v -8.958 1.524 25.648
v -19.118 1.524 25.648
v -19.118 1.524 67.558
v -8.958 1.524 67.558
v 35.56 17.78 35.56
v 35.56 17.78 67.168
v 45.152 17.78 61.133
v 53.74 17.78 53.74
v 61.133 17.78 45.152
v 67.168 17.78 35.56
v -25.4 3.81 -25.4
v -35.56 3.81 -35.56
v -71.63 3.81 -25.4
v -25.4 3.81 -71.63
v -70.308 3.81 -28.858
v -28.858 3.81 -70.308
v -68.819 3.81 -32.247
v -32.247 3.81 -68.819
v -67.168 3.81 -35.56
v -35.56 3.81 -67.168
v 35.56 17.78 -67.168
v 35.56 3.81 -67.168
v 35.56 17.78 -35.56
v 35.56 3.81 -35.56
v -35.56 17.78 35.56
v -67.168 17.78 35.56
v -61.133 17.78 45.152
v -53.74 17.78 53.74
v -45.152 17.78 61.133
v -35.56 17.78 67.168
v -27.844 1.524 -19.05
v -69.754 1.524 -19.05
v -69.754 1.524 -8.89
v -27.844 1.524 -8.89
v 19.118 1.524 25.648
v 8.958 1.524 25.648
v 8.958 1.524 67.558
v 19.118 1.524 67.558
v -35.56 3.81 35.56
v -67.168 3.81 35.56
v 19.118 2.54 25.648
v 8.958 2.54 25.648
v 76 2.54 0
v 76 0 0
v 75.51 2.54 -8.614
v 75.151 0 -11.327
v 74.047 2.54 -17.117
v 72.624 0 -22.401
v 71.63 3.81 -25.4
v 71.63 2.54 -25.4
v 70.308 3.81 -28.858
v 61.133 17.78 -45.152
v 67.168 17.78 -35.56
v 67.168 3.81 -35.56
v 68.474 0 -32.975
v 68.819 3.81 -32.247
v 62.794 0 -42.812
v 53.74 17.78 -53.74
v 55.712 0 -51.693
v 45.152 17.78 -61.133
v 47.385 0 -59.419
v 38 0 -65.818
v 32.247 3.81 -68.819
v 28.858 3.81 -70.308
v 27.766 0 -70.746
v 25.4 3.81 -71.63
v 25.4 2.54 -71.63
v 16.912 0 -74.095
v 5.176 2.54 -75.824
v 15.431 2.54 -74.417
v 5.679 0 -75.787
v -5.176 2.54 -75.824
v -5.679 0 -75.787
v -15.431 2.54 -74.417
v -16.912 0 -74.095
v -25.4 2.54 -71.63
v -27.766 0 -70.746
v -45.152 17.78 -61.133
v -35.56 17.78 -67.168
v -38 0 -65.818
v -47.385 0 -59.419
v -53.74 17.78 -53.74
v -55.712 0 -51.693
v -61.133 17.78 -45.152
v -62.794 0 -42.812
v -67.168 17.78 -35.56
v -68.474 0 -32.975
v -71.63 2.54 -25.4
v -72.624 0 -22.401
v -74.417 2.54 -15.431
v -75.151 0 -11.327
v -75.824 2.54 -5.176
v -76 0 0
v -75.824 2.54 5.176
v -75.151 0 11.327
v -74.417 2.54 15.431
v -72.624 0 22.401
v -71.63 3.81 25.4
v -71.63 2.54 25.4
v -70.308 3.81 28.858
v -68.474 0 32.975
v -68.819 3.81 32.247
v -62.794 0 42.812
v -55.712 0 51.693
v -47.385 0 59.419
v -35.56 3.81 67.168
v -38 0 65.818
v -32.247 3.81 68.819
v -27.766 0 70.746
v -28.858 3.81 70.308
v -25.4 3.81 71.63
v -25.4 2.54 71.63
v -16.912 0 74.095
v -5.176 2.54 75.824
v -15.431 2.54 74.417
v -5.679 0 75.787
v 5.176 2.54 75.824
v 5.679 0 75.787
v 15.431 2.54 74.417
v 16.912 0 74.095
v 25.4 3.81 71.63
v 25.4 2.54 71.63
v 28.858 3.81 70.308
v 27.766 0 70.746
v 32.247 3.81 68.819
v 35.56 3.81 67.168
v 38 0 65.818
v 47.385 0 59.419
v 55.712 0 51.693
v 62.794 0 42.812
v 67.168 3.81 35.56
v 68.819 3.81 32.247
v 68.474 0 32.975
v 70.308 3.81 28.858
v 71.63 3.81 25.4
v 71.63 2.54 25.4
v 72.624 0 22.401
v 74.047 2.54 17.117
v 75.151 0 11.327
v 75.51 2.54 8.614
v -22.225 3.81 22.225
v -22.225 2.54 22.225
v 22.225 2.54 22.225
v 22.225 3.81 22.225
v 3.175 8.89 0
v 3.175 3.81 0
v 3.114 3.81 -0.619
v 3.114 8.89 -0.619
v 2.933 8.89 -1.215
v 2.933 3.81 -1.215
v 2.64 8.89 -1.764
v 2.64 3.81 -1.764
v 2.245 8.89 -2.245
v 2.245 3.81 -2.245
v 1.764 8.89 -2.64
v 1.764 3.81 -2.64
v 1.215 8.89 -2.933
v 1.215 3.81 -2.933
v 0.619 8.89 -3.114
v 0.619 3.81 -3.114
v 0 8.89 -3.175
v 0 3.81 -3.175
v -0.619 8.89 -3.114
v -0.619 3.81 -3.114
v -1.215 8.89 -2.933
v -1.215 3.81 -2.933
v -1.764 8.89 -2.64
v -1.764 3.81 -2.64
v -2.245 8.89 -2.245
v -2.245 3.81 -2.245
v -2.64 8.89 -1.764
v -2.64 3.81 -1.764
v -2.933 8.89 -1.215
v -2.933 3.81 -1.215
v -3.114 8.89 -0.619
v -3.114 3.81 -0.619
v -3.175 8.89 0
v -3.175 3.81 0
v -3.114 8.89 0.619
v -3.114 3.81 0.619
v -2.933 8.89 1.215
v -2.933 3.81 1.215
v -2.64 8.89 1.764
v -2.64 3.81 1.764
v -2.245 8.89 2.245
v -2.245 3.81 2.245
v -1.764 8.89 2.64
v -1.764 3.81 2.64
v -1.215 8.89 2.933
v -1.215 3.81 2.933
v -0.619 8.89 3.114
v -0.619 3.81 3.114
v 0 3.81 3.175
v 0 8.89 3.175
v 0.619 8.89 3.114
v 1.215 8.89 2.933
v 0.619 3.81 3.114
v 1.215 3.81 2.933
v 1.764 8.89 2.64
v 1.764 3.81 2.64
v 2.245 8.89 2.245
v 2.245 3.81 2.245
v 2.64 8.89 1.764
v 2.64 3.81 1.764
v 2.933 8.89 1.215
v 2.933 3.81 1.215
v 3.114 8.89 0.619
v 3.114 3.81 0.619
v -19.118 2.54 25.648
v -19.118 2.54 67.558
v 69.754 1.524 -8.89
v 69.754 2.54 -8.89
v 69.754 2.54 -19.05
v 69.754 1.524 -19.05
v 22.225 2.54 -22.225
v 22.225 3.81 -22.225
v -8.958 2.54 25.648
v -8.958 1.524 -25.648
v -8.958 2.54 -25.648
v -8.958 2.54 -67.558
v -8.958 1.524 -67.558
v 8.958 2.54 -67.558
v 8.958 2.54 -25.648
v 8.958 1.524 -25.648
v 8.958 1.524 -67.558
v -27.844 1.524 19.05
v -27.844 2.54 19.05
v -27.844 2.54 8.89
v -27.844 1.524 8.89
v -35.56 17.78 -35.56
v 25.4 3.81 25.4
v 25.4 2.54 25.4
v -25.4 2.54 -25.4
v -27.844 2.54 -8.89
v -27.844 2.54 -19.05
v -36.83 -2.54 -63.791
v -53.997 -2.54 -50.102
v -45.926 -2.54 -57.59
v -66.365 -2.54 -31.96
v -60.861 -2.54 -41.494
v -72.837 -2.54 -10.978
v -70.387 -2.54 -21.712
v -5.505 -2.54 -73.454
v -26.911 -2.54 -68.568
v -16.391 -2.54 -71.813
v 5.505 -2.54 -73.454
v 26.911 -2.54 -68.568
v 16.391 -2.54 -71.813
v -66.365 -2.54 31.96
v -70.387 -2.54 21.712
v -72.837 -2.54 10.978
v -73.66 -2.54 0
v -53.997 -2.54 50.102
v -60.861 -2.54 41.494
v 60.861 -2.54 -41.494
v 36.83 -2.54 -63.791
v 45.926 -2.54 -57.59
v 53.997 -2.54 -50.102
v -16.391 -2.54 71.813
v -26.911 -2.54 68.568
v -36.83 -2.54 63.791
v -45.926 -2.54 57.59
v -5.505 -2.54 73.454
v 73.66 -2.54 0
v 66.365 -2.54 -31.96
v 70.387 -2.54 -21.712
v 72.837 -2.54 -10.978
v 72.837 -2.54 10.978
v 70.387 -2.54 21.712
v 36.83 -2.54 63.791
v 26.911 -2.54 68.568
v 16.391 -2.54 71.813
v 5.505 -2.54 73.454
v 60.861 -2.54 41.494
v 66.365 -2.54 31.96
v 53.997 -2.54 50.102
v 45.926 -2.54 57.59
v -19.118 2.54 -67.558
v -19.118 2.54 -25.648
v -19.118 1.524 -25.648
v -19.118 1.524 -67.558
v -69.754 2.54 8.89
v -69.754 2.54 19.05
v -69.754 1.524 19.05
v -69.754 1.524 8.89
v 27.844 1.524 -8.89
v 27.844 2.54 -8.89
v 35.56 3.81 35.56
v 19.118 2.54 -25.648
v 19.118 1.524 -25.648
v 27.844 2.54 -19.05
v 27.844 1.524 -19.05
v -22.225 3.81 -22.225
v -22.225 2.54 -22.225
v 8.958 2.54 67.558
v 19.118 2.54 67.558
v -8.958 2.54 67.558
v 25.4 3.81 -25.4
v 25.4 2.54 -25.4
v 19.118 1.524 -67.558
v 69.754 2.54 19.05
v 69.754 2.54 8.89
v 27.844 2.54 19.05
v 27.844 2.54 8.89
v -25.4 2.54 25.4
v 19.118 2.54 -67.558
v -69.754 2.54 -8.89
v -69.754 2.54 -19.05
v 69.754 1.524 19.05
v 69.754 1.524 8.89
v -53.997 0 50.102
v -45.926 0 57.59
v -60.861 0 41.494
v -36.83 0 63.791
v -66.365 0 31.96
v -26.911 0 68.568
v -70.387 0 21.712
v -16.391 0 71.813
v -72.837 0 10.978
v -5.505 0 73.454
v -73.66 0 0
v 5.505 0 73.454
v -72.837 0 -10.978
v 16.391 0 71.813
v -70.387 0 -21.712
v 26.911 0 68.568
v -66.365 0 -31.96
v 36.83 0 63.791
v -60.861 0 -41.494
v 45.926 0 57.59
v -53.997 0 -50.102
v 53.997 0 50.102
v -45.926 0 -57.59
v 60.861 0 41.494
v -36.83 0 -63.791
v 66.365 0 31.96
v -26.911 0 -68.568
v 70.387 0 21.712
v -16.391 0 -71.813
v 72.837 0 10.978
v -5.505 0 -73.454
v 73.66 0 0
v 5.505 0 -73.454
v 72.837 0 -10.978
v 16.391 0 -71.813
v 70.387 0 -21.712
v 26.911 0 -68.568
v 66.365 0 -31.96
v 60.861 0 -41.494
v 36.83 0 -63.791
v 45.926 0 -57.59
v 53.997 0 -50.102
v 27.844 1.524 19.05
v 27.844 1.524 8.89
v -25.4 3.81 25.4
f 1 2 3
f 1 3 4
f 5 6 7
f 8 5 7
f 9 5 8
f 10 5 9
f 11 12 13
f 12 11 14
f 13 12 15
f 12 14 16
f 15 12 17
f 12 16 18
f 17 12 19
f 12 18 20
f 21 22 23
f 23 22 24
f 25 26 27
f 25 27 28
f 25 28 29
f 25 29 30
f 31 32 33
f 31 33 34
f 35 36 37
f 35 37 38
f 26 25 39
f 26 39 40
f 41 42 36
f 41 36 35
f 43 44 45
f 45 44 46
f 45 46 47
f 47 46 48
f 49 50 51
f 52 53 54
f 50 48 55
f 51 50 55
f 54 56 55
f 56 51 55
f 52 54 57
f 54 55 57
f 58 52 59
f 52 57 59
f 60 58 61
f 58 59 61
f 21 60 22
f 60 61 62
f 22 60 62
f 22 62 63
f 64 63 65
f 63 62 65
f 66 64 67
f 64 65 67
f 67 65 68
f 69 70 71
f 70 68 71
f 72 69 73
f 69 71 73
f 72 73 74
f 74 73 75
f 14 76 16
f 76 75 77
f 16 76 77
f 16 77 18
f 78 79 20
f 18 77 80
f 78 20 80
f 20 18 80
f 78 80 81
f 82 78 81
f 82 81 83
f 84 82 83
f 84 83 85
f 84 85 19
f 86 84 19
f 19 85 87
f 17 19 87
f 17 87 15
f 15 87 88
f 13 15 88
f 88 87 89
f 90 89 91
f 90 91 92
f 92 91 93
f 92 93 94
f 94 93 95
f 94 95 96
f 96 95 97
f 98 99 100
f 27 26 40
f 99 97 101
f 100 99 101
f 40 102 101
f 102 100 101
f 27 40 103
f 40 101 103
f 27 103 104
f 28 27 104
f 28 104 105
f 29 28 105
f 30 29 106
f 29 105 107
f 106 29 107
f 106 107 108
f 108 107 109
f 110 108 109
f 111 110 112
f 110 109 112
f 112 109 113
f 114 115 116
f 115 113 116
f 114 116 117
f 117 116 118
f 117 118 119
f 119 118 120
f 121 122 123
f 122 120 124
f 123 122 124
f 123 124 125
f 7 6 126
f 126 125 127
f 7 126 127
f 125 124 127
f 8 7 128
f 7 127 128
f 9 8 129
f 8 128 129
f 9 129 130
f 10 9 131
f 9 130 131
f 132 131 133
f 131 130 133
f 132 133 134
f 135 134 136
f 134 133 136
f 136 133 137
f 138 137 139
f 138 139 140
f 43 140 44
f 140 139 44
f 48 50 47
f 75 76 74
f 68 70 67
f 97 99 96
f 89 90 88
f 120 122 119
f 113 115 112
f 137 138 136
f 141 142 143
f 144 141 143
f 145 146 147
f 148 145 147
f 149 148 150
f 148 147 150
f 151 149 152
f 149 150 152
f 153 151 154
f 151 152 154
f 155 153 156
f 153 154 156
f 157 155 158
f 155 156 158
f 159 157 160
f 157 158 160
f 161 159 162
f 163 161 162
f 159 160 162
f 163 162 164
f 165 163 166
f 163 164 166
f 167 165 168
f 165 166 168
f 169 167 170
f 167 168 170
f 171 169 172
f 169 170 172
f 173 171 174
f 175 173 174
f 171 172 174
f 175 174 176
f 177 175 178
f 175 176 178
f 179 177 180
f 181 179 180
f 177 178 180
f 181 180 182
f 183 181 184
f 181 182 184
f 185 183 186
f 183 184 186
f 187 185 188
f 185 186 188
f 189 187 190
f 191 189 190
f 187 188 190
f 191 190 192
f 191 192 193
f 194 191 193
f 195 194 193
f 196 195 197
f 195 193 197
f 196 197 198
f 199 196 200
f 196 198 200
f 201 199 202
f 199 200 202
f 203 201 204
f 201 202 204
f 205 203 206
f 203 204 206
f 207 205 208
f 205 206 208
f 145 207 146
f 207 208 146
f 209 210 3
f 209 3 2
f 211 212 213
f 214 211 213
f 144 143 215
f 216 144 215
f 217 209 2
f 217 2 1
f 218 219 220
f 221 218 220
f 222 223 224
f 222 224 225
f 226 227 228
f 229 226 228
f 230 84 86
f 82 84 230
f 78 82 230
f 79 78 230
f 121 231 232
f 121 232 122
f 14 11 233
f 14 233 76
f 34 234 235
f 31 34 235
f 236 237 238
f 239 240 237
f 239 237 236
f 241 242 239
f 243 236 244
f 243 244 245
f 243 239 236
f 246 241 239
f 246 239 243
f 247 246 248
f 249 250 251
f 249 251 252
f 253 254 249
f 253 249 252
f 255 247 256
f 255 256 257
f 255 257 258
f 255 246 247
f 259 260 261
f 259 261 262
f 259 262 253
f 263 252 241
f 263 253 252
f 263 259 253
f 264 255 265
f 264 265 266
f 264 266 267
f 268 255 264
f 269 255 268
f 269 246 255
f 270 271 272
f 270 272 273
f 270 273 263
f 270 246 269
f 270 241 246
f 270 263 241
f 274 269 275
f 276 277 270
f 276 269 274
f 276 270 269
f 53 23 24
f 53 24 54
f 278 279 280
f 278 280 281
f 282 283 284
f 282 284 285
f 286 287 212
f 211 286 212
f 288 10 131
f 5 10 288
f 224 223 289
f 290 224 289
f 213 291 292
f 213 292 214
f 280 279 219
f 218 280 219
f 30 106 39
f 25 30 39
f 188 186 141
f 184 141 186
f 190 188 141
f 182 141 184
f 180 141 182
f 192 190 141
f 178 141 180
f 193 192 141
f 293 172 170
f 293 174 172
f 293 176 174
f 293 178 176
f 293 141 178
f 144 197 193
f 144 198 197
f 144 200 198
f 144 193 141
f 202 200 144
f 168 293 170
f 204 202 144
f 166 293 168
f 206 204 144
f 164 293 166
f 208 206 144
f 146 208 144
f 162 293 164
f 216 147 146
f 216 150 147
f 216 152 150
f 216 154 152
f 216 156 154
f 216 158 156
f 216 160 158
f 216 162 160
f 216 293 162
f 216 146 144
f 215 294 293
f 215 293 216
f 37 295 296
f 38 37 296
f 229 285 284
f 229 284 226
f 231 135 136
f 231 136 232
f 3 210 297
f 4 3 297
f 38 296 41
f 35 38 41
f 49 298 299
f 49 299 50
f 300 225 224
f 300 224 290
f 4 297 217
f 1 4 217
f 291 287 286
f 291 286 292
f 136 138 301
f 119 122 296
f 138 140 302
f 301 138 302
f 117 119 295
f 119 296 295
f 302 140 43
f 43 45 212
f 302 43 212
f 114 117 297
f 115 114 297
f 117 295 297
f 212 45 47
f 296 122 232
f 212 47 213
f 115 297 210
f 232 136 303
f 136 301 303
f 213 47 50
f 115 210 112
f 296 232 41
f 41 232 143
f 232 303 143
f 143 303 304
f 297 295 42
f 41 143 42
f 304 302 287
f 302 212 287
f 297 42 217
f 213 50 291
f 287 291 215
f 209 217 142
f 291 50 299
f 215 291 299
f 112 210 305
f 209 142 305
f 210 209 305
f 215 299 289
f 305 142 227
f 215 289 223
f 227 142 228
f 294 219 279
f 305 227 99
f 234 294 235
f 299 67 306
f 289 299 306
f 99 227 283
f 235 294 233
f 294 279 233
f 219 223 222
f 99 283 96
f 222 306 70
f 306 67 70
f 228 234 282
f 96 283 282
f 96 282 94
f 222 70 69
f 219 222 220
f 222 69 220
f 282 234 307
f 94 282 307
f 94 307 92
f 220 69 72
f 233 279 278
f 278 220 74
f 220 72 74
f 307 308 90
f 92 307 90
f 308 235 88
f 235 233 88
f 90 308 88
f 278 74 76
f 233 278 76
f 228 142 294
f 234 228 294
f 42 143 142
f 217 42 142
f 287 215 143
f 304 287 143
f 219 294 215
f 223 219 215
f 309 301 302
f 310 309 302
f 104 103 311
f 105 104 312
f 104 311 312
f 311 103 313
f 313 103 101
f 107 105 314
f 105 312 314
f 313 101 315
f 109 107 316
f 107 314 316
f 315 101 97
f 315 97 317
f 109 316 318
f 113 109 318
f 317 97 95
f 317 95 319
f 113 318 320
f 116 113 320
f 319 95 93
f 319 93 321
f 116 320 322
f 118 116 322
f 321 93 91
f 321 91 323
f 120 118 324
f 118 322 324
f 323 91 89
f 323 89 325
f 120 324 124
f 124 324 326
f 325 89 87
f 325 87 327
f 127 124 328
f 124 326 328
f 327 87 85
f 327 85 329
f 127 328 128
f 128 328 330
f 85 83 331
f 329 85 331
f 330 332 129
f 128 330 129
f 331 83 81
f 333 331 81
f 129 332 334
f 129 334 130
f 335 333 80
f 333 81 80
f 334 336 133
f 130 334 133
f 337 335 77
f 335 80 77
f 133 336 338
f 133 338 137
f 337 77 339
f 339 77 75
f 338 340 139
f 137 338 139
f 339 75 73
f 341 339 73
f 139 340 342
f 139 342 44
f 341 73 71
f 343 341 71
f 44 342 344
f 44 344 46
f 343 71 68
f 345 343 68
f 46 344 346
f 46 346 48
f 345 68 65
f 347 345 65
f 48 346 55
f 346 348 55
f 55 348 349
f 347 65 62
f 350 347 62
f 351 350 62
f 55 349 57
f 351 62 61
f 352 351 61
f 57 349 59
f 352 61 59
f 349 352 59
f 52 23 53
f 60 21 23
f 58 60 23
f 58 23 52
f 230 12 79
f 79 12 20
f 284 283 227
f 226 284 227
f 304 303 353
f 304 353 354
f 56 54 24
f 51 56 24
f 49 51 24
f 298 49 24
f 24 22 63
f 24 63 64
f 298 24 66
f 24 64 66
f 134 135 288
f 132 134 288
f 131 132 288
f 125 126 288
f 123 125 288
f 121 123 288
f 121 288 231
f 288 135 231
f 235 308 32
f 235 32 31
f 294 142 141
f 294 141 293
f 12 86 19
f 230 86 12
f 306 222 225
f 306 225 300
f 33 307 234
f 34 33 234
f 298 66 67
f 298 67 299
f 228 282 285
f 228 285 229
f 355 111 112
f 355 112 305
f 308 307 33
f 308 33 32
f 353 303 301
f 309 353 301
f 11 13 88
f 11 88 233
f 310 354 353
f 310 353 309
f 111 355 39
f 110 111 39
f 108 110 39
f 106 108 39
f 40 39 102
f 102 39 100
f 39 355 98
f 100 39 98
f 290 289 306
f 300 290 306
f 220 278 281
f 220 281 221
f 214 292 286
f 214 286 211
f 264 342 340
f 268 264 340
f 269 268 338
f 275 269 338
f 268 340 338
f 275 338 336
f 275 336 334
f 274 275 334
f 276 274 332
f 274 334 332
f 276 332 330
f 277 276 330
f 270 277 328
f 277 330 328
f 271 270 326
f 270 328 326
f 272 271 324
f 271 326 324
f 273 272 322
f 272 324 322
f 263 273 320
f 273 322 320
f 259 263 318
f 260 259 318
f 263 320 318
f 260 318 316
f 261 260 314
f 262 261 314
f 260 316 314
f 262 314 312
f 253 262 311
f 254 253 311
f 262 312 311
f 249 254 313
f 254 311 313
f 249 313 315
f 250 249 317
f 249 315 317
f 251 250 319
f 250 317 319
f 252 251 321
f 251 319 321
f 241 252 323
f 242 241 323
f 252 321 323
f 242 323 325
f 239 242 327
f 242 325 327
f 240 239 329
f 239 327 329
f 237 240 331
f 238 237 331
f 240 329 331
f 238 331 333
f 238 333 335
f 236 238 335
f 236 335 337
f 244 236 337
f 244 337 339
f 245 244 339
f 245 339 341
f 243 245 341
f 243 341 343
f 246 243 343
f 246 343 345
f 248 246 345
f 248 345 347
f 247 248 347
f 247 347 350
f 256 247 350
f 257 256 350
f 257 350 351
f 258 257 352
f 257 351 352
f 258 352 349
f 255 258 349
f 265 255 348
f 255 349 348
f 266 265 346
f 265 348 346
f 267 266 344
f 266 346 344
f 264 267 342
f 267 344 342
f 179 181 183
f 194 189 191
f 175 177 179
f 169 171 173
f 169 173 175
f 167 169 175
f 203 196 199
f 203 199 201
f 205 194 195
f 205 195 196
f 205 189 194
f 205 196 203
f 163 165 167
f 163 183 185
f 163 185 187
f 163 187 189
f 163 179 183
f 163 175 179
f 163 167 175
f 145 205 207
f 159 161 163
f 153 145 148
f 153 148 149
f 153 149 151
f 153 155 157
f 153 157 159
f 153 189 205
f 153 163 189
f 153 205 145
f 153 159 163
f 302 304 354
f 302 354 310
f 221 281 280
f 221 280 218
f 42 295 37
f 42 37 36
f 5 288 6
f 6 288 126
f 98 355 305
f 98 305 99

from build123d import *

# Parameters (mm, degrees)
SKETCH2_R           = 76
BOSS_EXTRUDE1_DEPTH = 17.78
CUT_EXTRUDE3_DEPTH  = 13.97
CUT_EXTRUDE4_DEPTH  = 14.97
CUT_EXTRUDE5_DEPTH  = 1.27
SKETCH10_W          = 10.16
SKETCH10_H          = 41.91
SKETCH10_W_2        = 41.91
SKETCH10_H_2        = 10.16
CUT_EXTRUDE6_DEPTH  = 1.016
SKETCH11_W          = 44.45
SKETCH11_H          = 44.45
BOSS_EXTRUDE2_DEPTH = 1.27
SKETCH14_R          = 3.175
BOSS_EXTRUDE4_DEPTH = 5.08
SKETCH15_R          = 73.66
BOSS_EXTRUDE5_DEPTH = 2.54


with BuildPart() as part:
    # Sketch2 → Boss-Extrude1 (new body)
    with BuildSketch(Plane(origin=(0, 0, 0), x_dir=(1, 0, 0), z_dir=(0, 1, 0))):
        Circle(SKETCH2_R)
    extrude(amount=BOSS_EXTRUDE1_DEPTH)

    # Sketch6 → Cut-Extrude3 (cut)
    with BuildSketch(Plane(origin=(0, 17.78, 0), x_dir=(1, 0, 0), z_dir=(0, 1, 0))):
        with BuildLine():
            Line((-76, 35.56), (76, 35.56))
            ThreePointArc((76, 35.56), (111.56, 0), (76, -35.56))
            Line((76, -35.56), (-76, -35.56))
            ThreePointArc((-76, -35.56), (-111.56, 0), (-76, 35.56))
        make_face()
    extrude(amount=-CUT_EXTRUDE3_DEPTH, mode=Mode.SUBTRACT)

    # Sketch8 → Cut-Extrude4 (cut, through all)
    with BuildSketch(Plane(origin=(0, 3.81, 0), x_dir=(1, 0, 0), z_dir=(0, 1, 0))):
        with BuildLine():
            Line((35.56, 76), (35.56, -76))
            ThreePointArc((35.56, -76), (0, -111.56), (-35.56, -76))
            Line((-35.56, -76), (-35.56, 76))
            ThreePointArc((-35.56, 76), (0, 111.56), (35.56, 76))
        make_face()
    extrude(amount=CUT_EXTRUDE4_DEPTH, mode=Mode.SUBTRACT)

    # Sketch9 → Cut-Extrude5 (cut)
    with BuildSketch(Plane(origin=(0, 3.81, 0), x_dir=(1, 0, 0), z_dir=(0, 1, 0))):
        with BuildLine():
            Line((25.4, 76), (25.4, 25.4))
            Line((25.4, 25.4), (76, 25.4))
            ThreePointArc((76, 25.4), (101.4, 0), (76, -25.4))
            Line((76, -25.4), (25.4, -25.4))
            Line((25.4, -25.4), (25.4, -76))
            ThreePointArc((25.4, -76), (0, -101.4), (-25.4, -76))
            Line((-25.4, -76), (-25.4, -25.4))
            Line((-25.4, -25.4), (-76, -25.4))
            ThreePointArc((-76, -25.4), (-101.4, 0), (-76, 25.4))
            Line((-76, 25.4), (-25.4, 25.4))
            Line((-25.4, 25.4), (-25.4, 76))
            ThreePointArc((-25.4, 76), (0, 101.4), (25.4, 76))
        make_face()
    extrude(amount=-CUT_EXTRUDE5_DEPTH, mode=Mode.SUBTRACT)

    # Sketch10 → Cut-Extrude6 (cut)
    with BuildSketch(Plane(origin=(0, 2.54, 0), x_dir=(1, 0, 0), z_dir=(0, 1, 0))):
        with Locations((-14.037724316, 46.60290417)):
            Rectangle(SKETCH10_W, SKETCH10_H)
        with Locations((14.037724316, 46.60290417)):
            Rectangle(SKETCH10_W, SKETCH10_H)
        with Locations((14.037724316, -46.60290417)):
            Rectangle(SKETCH10_W, SKETCH10_H)
        with Locations((-14.037724316, -46.60290417)):
            Rectangle(SKETCH10_W, SKETCH10_H)
        with Locations((-48.79885899, 13.97)):
            Rectangle(SKETCH10_W_2, SKETCH10_H_2)
        with Locations((-48.79885899, -13.97)):
            Rectangle(SKETCH10_W_2, SKETCH10_H_2)
        with Locations((48.79885899, -13.97)):
            Rectangle(SKETCH10_W_2, SKETCH10_H_2)
        with Locations((48.79885899, 13.97)):
            Rectangle(SKETCH10_W_2, SKETCH10_H_2)
    extrude(amount=-CUT_EXTRUDE6_DEPTH, mode=Mode.SUBTRACT)

    # Sketch11 → Boss-Extrude2 (add)
    with BuildSketch(Plane(origin=(0, 2.54, 0), x_dir=(1, 0, 0), z_dir=(0, 1, 0))):
        Rectangle(SKETCH11_W, SKETCH11_H)
    extrude(amount=BOSS_EXTRUDE2_DEPTH)

    # Sketch14 → Boss-Extrude4 (add)
    with BuildSketch(Plane(origin=(0, 3.81, 0), x_dir=(1, 0, 0), z_dir=(0, 1, 0))):
        Circle(SKETCH14_R)
    extrude(amount=BOSS_EXTRUDE4_DEPTH)

    # Sketch15 → Boss-Extrude5 (add)
    with BuildSketch(Plane.XZ):
        Circle(SKETCH15_R)
    extrude(amount=BOSS_EXTRUDE5_DEPTH)


solid = part.part
